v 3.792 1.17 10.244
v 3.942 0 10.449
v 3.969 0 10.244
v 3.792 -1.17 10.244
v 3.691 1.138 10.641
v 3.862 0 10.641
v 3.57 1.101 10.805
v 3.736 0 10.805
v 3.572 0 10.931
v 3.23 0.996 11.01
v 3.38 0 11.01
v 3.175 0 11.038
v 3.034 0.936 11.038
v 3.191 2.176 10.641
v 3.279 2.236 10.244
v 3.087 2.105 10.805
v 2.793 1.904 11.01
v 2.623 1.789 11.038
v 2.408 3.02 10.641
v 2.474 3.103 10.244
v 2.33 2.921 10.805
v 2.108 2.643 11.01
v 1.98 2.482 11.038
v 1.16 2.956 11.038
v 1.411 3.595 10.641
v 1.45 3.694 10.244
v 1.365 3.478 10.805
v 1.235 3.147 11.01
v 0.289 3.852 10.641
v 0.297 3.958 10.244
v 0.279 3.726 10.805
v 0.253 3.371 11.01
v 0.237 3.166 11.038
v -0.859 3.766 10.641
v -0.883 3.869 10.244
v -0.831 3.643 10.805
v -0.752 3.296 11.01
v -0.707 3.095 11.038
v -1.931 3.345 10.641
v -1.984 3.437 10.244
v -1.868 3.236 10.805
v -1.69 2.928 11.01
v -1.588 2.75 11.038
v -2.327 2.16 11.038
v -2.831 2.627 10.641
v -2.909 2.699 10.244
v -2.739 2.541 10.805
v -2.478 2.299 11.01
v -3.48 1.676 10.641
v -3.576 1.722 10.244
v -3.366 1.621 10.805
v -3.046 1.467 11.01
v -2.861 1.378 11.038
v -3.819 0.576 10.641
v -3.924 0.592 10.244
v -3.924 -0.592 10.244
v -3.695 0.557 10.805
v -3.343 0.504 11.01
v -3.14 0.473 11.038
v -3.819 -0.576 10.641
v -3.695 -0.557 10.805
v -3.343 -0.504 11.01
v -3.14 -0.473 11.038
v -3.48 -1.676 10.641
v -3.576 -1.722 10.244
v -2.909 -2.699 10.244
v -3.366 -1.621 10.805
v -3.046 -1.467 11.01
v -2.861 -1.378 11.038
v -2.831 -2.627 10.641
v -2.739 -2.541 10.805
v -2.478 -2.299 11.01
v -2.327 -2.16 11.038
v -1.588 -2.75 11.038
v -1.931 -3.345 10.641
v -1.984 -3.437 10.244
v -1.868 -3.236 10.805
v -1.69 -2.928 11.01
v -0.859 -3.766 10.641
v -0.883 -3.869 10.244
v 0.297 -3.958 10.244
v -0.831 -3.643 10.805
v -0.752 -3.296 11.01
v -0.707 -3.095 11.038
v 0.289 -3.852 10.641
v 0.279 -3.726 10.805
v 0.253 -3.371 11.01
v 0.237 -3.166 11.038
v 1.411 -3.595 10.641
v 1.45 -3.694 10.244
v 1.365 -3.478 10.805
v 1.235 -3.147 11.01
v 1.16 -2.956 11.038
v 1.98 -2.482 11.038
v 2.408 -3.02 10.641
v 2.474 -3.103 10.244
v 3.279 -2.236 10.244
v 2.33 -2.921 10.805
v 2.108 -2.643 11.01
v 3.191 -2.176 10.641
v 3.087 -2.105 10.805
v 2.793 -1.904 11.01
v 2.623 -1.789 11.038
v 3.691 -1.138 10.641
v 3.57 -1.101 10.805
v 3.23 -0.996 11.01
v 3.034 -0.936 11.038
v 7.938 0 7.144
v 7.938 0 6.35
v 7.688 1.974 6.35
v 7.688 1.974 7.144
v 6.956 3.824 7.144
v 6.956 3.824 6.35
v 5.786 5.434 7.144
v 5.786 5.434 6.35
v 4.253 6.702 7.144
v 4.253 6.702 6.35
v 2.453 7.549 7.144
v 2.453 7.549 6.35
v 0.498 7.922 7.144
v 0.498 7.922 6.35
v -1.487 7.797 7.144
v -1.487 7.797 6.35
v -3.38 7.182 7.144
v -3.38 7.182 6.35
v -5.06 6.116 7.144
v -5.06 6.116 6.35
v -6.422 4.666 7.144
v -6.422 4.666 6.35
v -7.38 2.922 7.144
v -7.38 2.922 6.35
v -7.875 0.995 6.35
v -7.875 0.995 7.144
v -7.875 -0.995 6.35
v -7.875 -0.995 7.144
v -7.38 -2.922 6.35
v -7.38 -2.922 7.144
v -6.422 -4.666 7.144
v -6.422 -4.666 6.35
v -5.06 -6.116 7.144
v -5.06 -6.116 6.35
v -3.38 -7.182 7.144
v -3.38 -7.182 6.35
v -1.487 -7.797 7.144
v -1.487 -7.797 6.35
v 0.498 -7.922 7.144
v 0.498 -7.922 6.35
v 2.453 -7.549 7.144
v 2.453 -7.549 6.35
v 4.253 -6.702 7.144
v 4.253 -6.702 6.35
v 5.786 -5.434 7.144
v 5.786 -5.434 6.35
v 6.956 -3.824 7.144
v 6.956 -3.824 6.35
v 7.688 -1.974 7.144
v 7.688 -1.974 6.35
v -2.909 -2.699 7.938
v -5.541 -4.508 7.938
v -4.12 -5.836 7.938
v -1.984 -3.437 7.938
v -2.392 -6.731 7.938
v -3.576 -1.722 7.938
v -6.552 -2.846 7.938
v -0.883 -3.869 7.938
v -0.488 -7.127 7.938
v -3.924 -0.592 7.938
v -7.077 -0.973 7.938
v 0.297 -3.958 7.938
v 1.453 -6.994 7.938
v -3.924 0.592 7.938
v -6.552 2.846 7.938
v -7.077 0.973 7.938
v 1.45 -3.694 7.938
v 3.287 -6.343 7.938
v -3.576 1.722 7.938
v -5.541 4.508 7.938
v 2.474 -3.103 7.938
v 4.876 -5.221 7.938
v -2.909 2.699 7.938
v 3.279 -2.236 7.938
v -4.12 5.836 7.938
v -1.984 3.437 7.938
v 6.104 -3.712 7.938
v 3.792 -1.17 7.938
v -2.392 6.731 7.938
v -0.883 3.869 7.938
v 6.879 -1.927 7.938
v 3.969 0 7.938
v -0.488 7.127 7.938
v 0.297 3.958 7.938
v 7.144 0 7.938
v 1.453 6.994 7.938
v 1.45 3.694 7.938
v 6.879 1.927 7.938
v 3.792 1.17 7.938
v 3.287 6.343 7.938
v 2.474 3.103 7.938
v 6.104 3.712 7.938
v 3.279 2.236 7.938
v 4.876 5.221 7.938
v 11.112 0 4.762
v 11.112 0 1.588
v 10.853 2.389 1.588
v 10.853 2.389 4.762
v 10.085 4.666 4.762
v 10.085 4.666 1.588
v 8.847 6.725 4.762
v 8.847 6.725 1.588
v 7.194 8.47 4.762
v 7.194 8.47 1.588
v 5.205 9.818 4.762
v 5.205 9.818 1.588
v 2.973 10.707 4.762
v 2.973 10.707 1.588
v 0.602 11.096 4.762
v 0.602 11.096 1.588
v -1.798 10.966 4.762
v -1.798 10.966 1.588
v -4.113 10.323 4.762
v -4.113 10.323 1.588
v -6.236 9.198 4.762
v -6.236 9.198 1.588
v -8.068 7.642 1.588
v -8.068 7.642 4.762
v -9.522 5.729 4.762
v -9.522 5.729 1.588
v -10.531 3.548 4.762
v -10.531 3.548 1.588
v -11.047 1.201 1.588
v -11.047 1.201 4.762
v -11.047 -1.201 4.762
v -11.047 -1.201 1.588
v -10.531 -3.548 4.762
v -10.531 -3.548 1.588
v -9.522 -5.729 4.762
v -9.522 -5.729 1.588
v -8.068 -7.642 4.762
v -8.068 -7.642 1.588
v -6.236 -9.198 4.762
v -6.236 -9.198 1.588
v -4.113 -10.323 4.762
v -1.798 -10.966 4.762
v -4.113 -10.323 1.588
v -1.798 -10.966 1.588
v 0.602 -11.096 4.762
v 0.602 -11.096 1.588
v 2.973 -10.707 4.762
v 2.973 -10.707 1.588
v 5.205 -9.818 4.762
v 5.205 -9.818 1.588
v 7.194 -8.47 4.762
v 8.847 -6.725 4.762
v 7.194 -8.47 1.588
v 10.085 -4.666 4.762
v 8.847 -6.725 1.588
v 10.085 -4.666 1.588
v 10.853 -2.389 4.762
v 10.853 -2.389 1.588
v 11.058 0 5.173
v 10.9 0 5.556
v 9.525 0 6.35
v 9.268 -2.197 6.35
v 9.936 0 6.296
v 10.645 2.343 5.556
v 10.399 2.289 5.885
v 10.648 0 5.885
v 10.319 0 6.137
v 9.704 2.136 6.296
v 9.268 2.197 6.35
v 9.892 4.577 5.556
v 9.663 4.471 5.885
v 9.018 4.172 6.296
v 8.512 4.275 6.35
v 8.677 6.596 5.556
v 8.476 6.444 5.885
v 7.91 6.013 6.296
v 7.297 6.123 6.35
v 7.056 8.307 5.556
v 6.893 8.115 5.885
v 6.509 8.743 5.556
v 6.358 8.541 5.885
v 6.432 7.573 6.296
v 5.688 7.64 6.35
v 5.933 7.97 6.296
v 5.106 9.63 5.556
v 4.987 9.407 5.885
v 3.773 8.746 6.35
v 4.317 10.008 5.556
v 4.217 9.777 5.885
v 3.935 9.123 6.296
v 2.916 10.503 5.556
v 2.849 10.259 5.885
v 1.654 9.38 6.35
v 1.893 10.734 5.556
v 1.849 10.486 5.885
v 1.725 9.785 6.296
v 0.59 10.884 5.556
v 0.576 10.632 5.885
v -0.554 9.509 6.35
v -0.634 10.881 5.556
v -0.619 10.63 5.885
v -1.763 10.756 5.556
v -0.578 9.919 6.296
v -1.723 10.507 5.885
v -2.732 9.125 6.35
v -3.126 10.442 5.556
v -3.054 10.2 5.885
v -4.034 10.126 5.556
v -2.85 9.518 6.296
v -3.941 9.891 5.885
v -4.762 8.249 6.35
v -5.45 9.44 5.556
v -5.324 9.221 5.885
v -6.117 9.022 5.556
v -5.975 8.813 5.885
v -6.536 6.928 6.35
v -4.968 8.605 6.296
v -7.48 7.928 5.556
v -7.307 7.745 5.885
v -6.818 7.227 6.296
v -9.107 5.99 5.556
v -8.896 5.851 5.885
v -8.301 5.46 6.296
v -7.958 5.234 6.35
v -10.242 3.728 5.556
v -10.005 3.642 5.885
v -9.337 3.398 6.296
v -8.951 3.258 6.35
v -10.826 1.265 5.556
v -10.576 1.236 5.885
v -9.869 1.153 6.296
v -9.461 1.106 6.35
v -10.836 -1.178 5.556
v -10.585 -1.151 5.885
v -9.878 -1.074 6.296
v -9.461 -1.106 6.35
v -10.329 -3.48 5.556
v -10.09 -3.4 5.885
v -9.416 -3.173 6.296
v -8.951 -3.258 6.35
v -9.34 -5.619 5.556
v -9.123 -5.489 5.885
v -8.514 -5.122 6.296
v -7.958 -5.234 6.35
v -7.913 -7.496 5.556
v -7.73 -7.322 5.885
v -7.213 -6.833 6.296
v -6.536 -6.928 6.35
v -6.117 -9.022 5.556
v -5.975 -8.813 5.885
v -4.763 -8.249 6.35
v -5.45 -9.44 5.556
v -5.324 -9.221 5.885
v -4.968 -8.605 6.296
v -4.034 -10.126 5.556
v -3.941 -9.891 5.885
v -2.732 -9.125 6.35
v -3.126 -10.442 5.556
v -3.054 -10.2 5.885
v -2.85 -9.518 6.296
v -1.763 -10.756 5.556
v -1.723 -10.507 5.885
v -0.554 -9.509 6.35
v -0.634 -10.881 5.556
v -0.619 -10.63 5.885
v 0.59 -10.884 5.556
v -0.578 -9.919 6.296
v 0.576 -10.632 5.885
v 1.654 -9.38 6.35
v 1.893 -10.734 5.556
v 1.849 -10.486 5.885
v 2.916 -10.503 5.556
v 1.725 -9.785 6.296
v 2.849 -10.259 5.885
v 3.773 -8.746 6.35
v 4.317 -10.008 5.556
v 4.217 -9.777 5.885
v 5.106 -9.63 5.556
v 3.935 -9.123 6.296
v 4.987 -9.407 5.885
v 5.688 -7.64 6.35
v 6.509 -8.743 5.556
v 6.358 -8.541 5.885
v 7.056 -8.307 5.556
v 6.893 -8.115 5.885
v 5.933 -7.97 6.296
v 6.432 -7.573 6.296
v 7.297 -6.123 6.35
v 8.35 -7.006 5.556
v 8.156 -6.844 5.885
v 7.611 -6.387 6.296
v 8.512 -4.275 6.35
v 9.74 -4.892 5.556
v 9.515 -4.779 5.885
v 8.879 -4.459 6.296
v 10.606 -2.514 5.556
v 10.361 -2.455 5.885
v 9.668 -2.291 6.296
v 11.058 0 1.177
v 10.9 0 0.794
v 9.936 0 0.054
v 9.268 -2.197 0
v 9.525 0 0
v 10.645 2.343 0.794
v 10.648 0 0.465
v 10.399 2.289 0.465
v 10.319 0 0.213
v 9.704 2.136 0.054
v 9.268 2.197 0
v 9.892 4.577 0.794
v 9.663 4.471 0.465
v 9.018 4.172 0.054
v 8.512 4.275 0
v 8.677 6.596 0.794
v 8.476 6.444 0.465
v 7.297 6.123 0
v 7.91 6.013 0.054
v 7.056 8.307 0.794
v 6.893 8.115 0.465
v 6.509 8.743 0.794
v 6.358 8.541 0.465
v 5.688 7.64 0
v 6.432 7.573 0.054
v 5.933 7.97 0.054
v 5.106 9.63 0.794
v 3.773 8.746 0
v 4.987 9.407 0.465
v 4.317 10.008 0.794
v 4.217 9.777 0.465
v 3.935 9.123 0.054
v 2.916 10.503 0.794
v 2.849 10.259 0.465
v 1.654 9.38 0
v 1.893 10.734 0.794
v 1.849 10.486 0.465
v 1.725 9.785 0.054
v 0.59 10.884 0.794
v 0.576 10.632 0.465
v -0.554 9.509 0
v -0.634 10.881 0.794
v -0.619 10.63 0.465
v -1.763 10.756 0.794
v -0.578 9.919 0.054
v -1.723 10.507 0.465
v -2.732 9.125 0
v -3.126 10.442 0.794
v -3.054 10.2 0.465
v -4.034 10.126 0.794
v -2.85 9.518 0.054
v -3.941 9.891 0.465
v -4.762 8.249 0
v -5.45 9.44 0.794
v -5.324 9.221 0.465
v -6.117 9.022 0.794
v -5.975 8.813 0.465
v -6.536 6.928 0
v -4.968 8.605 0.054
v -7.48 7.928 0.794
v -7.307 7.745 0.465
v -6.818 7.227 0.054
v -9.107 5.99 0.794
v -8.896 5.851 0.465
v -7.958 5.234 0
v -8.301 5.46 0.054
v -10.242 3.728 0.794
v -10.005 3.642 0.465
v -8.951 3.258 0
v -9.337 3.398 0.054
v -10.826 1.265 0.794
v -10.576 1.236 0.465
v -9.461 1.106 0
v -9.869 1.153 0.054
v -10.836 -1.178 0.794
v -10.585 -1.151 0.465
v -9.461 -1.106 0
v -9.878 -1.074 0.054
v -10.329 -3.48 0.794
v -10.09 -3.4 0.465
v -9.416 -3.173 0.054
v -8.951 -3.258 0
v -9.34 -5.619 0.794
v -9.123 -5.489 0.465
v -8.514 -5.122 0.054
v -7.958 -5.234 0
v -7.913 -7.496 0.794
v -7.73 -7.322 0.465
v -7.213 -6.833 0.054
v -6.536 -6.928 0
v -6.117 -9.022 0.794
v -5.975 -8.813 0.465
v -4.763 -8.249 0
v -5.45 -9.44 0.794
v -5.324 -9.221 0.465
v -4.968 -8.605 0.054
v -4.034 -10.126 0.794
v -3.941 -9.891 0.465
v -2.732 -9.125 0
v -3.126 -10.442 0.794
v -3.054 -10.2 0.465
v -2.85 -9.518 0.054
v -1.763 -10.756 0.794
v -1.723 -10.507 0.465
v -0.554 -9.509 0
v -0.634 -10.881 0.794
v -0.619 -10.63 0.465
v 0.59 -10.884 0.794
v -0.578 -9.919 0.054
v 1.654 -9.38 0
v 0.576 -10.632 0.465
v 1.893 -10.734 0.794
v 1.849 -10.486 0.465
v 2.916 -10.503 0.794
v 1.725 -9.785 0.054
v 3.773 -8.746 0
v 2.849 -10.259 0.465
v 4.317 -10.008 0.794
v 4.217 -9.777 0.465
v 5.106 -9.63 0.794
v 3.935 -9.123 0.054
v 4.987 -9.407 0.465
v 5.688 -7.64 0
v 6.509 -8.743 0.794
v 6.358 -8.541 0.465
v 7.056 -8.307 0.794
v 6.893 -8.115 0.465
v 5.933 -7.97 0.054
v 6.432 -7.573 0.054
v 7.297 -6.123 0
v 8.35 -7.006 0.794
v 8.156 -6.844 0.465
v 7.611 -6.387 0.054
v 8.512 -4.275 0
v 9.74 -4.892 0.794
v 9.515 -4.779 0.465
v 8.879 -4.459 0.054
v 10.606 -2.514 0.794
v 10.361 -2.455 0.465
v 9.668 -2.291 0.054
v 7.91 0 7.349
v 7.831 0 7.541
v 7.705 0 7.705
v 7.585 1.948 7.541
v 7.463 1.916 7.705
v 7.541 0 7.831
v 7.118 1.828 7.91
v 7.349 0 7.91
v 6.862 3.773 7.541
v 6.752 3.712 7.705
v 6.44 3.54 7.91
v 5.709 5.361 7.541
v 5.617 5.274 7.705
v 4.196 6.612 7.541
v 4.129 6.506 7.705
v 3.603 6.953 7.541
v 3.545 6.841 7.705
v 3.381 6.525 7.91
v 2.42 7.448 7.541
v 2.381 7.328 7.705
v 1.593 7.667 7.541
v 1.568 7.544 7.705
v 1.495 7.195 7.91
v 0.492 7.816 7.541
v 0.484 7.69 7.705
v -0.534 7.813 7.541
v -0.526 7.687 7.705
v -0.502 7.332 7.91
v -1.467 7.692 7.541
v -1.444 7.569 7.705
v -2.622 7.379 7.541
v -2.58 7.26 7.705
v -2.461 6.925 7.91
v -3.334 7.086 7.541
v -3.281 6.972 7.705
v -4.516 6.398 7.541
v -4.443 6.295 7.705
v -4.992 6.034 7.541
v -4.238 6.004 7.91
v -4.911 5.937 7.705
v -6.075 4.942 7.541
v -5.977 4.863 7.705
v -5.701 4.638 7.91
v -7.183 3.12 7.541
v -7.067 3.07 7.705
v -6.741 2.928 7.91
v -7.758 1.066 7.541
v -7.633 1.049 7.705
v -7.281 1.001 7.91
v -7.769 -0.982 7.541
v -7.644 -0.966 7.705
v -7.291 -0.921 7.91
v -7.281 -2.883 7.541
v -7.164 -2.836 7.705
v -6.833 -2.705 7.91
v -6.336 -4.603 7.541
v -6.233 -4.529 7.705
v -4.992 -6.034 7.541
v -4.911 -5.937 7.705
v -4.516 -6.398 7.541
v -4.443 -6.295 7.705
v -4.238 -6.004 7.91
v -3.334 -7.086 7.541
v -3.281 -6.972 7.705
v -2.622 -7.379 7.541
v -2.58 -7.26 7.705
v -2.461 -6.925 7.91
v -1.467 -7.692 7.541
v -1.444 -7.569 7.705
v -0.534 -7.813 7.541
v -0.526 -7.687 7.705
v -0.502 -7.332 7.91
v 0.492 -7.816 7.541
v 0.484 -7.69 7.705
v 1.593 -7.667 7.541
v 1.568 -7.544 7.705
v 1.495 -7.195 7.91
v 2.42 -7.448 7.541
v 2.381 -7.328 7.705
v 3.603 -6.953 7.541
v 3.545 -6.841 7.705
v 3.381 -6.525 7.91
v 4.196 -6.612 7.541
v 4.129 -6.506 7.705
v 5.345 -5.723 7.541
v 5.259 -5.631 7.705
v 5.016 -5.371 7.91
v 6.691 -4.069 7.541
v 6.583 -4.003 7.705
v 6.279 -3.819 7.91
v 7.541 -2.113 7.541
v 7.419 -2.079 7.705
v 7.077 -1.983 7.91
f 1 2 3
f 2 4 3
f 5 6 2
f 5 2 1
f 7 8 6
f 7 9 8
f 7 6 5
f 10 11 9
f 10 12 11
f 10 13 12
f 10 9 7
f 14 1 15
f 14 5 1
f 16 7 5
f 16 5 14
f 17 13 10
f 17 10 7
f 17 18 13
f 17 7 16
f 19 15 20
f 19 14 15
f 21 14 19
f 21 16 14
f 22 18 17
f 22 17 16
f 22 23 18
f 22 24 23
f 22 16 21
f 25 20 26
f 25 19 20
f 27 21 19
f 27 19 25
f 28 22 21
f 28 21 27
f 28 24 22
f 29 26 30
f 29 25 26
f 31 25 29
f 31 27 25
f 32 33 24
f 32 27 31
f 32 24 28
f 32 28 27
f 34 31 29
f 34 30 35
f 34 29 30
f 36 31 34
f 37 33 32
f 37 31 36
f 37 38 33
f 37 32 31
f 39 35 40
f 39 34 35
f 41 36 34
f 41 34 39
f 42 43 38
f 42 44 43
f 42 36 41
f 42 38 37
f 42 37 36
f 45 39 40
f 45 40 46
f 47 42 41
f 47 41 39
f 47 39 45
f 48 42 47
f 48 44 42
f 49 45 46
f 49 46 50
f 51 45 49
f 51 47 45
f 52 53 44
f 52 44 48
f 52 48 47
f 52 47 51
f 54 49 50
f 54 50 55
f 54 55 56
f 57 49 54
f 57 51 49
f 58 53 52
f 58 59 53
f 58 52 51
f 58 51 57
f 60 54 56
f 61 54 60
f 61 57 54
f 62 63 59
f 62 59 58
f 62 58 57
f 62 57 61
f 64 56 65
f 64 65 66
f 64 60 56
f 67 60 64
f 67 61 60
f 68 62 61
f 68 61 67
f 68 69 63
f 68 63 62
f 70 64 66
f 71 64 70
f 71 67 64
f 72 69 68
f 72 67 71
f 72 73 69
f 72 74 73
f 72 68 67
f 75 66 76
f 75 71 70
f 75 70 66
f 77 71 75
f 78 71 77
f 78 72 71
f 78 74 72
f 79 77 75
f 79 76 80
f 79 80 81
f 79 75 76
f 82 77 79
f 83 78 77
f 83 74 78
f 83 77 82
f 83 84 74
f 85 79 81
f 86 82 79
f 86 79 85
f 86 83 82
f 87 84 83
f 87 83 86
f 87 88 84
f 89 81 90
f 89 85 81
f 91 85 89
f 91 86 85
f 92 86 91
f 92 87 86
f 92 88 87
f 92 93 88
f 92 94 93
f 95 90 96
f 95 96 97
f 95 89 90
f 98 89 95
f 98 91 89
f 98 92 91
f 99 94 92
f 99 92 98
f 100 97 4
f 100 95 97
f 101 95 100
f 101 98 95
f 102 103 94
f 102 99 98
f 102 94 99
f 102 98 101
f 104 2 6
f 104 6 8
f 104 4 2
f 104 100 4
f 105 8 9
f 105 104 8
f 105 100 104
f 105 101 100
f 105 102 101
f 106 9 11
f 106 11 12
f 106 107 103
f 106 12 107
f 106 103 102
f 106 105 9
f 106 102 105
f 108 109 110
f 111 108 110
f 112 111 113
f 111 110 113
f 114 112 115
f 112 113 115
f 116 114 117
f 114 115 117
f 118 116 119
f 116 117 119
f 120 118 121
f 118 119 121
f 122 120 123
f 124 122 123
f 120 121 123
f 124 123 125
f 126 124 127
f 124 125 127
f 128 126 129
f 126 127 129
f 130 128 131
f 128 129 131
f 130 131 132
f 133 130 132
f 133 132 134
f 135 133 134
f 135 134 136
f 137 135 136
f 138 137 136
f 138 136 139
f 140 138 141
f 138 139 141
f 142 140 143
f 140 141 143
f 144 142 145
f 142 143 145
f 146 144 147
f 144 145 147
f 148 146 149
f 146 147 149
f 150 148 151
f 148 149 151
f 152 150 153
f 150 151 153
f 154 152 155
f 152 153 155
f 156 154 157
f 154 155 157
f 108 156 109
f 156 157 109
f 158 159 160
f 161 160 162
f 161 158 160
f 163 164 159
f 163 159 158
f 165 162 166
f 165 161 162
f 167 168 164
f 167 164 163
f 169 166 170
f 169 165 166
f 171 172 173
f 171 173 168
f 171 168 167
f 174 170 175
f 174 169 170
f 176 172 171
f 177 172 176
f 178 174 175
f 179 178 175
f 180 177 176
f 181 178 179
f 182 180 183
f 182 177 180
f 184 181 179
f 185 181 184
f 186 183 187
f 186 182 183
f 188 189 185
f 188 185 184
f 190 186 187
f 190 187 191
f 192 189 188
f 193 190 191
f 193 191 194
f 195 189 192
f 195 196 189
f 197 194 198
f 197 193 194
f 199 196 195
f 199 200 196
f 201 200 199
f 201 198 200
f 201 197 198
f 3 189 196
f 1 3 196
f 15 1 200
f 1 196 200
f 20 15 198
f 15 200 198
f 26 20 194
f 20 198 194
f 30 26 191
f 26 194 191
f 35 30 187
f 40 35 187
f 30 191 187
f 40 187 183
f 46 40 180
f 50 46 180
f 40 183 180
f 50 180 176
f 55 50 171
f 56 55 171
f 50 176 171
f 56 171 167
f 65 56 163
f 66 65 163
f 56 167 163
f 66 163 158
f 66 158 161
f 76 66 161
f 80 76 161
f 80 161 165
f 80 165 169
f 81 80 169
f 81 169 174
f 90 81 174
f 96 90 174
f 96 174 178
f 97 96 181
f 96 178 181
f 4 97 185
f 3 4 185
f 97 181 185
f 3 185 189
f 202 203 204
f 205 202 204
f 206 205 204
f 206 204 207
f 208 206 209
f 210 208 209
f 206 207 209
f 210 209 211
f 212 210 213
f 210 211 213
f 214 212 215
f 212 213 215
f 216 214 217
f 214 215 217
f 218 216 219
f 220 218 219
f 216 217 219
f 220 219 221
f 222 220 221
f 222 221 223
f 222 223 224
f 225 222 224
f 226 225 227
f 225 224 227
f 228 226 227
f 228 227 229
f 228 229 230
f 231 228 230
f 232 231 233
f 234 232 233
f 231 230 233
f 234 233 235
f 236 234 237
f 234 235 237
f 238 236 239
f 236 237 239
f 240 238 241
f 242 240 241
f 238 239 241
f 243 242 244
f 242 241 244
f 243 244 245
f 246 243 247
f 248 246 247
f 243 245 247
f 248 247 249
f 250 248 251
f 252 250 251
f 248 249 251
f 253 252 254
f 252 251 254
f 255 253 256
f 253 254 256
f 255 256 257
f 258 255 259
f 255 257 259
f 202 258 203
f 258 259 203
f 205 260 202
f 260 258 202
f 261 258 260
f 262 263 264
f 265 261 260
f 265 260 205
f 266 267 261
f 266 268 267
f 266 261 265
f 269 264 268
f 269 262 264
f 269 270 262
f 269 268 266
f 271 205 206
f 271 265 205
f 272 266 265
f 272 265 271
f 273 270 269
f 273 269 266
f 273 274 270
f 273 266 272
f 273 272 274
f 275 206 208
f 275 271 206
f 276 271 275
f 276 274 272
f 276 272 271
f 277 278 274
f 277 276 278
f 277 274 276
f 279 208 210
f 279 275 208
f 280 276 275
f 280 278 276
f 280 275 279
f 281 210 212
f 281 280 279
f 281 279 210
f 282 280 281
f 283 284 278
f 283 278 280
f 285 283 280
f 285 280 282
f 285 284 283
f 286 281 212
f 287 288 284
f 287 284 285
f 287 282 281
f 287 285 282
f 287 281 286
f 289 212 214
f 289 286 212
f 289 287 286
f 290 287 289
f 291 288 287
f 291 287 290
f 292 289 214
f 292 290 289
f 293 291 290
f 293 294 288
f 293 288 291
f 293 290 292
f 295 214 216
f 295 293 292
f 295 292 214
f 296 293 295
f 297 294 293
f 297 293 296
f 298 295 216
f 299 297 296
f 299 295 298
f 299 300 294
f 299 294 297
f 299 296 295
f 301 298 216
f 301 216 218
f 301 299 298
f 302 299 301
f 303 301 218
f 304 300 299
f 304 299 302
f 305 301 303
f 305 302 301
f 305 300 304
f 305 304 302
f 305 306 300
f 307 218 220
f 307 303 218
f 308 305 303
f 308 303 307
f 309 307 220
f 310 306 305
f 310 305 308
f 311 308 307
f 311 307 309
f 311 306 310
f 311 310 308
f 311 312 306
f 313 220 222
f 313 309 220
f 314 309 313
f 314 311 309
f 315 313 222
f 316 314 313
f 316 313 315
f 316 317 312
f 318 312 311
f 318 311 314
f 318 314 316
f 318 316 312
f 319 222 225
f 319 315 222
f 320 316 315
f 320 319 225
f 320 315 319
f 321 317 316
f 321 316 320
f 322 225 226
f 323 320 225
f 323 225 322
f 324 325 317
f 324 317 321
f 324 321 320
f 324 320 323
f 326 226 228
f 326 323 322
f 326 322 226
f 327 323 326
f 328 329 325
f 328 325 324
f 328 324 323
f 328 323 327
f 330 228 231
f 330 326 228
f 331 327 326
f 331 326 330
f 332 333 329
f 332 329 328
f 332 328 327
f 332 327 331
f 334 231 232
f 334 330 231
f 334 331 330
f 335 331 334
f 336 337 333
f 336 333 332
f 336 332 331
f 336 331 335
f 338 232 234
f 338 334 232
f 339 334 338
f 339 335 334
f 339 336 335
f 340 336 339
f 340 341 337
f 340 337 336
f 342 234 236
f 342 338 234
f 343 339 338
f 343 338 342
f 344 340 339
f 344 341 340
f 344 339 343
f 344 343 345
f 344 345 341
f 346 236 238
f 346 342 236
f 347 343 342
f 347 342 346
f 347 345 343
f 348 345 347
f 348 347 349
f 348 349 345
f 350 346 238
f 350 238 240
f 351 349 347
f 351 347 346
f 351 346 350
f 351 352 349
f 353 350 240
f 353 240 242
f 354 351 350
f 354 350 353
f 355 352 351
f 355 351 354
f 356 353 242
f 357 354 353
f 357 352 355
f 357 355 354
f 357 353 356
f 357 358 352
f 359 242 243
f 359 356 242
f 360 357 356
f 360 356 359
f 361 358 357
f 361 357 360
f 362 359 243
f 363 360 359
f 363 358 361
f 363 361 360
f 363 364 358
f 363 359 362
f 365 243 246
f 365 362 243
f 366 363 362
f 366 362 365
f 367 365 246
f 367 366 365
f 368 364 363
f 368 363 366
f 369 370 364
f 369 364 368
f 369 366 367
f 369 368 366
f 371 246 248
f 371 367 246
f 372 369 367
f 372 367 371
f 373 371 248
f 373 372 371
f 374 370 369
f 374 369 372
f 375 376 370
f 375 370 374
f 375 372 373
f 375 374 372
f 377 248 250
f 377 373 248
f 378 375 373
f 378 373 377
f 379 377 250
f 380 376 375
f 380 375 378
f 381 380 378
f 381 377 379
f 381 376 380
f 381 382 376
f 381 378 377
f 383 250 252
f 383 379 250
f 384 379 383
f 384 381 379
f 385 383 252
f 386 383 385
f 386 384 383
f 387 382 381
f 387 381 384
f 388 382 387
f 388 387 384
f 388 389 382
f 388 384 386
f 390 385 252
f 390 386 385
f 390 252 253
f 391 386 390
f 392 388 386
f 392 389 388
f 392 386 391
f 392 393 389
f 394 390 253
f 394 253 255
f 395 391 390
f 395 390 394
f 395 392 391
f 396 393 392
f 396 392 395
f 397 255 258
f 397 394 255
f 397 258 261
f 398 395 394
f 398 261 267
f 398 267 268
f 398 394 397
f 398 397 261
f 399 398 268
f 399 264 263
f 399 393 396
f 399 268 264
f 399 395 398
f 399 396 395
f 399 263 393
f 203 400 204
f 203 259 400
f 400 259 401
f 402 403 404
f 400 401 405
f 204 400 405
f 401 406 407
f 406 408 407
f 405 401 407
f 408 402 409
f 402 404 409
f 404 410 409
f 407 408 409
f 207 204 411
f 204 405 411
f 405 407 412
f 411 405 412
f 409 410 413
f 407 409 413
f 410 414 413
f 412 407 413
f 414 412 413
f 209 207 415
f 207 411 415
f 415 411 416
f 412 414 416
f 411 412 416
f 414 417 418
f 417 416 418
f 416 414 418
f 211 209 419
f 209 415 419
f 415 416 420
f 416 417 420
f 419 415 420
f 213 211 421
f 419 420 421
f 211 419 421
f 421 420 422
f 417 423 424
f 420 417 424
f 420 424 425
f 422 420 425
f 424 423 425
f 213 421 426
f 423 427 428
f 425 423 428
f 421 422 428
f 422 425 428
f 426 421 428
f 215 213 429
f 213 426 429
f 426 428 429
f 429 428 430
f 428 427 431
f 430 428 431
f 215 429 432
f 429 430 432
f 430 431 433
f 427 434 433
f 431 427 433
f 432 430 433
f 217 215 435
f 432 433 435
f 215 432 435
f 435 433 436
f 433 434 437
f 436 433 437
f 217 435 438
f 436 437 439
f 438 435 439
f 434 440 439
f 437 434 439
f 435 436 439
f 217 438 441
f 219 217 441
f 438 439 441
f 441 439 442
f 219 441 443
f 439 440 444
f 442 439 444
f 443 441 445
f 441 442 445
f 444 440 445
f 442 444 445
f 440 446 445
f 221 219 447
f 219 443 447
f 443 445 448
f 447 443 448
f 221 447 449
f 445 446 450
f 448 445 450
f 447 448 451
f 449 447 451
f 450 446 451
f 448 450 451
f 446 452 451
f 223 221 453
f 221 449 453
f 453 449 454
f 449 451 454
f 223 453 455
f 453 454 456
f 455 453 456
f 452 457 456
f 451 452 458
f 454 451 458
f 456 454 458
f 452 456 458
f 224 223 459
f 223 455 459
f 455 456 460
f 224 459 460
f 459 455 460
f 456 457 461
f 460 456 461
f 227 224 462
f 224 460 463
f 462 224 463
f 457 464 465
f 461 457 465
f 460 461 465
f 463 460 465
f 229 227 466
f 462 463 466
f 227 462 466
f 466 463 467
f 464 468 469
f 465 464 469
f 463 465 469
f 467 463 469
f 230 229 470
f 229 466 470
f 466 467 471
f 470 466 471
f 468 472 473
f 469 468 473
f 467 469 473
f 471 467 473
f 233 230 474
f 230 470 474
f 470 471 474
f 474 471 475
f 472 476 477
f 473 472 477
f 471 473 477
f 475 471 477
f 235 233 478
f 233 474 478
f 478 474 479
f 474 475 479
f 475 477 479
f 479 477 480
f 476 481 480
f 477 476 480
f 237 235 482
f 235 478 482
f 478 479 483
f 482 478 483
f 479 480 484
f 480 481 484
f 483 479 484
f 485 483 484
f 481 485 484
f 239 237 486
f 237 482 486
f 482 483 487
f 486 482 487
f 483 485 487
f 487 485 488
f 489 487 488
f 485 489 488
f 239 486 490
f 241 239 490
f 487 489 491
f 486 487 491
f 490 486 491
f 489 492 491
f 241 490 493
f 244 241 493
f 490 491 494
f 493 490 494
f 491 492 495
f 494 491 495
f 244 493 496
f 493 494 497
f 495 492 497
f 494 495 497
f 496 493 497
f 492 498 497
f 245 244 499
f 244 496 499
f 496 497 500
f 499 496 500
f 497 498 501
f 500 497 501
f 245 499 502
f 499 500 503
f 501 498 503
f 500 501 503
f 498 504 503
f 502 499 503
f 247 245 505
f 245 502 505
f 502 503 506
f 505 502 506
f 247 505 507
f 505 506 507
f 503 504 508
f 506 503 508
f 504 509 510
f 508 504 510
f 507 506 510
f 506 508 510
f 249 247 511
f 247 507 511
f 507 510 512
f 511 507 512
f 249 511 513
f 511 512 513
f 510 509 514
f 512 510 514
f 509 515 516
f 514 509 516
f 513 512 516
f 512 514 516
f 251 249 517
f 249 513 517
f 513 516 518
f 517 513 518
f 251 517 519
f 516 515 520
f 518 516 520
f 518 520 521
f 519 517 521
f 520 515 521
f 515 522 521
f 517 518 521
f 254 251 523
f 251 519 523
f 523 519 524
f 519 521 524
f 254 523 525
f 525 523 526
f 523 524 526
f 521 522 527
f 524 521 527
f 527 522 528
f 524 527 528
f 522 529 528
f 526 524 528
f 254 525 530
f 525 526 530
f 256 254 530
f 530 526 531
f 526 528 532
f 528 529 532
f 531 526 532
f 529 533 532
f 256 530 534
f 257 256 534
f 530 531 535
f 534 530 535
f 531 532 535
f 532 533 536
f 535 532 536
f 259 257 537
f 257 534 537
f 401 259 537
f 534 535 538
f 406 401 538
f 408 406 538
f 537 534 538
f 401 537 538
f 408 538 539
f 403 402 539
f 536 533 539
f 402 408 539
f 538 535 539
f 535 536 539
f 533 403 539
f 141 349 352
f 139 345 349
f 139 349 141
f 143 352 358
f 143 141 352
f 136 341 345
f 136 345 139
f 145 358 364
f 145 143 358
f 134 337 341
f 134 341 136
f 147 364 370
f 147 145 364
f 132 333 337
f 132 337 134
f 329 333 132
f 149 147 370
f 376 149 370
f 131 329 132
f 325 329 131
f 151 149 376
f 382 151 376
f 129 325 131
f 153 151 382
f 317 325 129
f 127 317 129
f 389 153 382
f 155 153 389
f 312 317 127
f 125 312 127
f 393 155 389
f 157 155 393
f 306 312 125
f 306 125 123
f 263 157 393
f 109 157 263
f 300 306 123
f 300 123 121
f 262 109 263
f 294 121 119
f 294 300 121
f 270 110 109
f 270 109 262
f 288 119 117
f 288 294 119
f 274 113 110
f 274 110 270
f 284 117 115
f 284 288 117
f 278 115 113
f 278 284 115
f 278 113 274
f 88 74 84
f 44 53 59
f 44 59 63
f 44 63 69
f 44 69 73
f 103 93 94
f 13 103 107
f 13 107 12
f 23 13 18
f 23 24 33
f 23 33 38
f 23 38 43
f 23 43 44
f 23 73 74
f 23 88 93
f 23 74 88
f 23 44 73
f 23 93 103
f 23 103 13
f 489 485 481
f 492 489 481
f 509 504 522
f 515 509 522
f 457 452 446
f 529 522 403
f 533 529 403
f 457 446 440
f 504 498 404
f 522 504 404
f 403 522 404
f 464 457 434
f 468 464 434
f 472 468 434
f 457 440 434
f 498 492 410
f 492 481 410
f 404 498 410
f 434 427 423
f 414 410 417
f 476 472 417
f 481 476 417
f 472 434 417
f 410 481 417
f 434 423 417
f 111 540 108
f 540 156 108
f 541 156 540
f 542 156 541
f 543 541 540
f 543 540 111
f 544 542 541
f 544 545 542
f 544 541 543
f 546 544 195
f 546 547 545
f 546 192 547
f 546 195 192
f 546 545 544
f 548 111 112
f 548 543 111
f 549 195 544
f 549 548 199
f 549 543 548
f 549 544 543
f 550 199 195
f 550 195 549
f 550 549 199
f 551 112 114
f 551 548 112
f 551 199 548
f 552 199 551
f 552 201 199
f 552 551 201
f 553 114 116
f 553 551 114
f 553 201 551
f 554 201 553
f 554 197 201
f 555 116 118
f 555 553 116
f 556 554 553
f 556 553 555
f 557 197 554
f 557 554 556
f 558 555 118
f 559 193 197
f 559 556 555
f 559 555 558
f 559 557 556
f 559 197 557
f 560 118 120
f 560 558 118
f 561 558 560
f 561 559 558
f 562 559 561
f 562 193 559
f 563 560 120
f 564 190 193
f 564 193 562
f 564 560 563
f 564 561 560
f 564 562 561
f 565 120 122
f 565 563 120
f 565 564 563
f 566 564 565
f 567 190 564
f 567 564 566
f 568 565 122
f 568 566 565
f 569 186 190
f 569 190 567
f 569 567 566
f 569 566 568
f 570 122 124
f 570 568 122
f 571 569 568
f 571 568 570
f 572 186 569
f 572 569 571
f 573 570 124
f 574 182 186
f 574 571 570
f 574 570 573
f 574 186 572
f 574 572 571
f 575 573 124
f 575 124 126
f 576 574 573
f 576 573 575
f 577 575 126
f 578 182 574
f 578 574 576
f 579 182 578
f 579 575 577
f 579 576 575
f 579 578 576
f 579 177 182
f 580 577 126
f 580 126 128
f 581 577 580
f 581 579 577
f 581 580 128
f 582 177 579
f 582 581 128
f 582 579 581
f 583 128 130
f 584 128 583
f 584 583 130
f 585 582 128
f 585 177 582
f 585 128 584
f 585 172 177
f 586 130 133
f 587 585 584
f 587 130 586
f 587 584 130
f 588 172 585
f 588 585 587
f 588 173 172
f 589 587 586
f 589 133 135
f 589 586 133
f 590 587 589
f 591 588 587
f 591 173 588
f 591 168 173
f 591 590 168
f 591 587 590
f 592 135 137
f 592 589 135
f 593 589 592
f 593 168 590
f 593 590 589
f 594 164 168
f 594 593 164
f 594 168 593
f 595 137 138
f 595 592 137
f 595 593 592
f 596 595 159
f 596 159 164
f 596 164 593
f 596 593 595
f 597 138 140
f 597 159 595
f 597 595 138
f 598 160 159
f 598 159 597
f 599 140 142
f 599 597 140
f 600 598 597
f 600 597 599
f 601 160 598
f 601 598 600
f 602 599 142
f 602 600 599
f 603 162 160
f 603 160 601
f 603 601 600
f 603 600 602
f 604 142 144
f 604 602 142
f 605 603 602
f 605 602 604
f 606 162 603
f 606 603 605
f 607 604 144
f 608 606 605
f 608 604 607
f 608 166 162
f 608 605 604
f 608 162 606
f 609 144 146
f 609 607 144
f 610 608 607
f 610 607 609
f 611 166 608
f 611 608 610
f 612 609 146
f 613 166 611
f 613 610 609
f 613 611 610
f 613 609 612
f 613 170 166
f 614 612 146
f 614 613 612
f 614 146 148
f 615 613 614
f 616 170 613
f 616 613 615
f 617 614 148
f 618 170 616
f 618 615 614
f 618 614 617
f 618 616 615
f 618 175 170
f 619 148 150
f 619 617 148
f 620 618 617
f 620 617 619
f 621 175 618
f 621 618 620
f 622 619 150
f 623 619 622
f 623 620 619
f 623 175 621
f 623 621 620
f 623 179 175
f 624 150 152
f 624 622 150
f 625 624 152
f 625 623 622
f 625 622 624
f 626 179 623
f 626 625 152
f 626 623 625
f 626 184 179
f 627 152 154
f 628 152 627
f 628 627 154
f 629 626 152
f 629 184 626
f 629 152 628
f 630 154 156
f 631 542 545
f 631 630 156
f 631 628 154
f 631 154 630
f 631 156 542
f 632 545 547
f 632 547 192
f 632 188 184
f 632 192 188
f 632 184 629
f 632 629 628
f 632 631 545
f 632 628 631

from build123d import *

# Parameters (mm, degrees)
CYLINDER001_R     = 11.1125
CYLINDER001_DEPTH = 6.35
FILLET006_R       = 1.5875
FILLET007_R       = 1.5875
SKETCH003_R       = 7.9375
PAD003_DEPTH      = 1.5875
FILLET008_R       = 0.79375
SKETCH004_R       = 3.96875
PAD004_DEPTH      = 3.1
FILLET009_R       = 0.79375


with BuildPart() as part:
    # Cylinder001 → Cylinder001 (new body)
    with BuildSketch(Plane.XY):
        Circle(CYLINDER001_R)
    extrude(amount=CYLINDER001_DEPTH)

    # Fillet006
    fillet006_edges = [part.edges().sort_by_distance(p)[0] for p in [
        (-11.1125, 0, 6.35),
    ]]
    fillet(fillet006_edges, radius=FILLET006_R)

    # Fillet007
    fillet007_edges = [part.edges().sort_by_distance(p)[0] for p in [
        (-11.1125, 0, 0),
    ]]
    fillet(fillet007_edges, radius=FILLET007_R)

    # Sketch003 → Pad003 (new body)
    with BuildSketch(Plane.XY.offset(6.35)):
        Circle(SKETCH003_R)
    extrude(amount=PAD003_DEPTH)

    # Fillet008
    fillet008_edges = [part.edges().sort_by_distance(p)[0] for p in [
        (-7.9375, 0, 7.9375),
    ]]
    fillet(fillet008_edges, radius=FILLET008_R)

    # Sketch004 → Pad004 (new body)
    with BuildSketch(Plane.XY.offset(7.9375)):
        Circle(SKETCH004_R)
    extrude(amount=PAD004_DEPTH)

    # Fillet009
    fillet009_edges = [part.edges().sort_by_distance(p)[0] for p in [
        (-3.96875, 0, 11.0375),
    ]]
    fillet(fillet009_edges, radius=FILLET009_R)


solid = part.part
